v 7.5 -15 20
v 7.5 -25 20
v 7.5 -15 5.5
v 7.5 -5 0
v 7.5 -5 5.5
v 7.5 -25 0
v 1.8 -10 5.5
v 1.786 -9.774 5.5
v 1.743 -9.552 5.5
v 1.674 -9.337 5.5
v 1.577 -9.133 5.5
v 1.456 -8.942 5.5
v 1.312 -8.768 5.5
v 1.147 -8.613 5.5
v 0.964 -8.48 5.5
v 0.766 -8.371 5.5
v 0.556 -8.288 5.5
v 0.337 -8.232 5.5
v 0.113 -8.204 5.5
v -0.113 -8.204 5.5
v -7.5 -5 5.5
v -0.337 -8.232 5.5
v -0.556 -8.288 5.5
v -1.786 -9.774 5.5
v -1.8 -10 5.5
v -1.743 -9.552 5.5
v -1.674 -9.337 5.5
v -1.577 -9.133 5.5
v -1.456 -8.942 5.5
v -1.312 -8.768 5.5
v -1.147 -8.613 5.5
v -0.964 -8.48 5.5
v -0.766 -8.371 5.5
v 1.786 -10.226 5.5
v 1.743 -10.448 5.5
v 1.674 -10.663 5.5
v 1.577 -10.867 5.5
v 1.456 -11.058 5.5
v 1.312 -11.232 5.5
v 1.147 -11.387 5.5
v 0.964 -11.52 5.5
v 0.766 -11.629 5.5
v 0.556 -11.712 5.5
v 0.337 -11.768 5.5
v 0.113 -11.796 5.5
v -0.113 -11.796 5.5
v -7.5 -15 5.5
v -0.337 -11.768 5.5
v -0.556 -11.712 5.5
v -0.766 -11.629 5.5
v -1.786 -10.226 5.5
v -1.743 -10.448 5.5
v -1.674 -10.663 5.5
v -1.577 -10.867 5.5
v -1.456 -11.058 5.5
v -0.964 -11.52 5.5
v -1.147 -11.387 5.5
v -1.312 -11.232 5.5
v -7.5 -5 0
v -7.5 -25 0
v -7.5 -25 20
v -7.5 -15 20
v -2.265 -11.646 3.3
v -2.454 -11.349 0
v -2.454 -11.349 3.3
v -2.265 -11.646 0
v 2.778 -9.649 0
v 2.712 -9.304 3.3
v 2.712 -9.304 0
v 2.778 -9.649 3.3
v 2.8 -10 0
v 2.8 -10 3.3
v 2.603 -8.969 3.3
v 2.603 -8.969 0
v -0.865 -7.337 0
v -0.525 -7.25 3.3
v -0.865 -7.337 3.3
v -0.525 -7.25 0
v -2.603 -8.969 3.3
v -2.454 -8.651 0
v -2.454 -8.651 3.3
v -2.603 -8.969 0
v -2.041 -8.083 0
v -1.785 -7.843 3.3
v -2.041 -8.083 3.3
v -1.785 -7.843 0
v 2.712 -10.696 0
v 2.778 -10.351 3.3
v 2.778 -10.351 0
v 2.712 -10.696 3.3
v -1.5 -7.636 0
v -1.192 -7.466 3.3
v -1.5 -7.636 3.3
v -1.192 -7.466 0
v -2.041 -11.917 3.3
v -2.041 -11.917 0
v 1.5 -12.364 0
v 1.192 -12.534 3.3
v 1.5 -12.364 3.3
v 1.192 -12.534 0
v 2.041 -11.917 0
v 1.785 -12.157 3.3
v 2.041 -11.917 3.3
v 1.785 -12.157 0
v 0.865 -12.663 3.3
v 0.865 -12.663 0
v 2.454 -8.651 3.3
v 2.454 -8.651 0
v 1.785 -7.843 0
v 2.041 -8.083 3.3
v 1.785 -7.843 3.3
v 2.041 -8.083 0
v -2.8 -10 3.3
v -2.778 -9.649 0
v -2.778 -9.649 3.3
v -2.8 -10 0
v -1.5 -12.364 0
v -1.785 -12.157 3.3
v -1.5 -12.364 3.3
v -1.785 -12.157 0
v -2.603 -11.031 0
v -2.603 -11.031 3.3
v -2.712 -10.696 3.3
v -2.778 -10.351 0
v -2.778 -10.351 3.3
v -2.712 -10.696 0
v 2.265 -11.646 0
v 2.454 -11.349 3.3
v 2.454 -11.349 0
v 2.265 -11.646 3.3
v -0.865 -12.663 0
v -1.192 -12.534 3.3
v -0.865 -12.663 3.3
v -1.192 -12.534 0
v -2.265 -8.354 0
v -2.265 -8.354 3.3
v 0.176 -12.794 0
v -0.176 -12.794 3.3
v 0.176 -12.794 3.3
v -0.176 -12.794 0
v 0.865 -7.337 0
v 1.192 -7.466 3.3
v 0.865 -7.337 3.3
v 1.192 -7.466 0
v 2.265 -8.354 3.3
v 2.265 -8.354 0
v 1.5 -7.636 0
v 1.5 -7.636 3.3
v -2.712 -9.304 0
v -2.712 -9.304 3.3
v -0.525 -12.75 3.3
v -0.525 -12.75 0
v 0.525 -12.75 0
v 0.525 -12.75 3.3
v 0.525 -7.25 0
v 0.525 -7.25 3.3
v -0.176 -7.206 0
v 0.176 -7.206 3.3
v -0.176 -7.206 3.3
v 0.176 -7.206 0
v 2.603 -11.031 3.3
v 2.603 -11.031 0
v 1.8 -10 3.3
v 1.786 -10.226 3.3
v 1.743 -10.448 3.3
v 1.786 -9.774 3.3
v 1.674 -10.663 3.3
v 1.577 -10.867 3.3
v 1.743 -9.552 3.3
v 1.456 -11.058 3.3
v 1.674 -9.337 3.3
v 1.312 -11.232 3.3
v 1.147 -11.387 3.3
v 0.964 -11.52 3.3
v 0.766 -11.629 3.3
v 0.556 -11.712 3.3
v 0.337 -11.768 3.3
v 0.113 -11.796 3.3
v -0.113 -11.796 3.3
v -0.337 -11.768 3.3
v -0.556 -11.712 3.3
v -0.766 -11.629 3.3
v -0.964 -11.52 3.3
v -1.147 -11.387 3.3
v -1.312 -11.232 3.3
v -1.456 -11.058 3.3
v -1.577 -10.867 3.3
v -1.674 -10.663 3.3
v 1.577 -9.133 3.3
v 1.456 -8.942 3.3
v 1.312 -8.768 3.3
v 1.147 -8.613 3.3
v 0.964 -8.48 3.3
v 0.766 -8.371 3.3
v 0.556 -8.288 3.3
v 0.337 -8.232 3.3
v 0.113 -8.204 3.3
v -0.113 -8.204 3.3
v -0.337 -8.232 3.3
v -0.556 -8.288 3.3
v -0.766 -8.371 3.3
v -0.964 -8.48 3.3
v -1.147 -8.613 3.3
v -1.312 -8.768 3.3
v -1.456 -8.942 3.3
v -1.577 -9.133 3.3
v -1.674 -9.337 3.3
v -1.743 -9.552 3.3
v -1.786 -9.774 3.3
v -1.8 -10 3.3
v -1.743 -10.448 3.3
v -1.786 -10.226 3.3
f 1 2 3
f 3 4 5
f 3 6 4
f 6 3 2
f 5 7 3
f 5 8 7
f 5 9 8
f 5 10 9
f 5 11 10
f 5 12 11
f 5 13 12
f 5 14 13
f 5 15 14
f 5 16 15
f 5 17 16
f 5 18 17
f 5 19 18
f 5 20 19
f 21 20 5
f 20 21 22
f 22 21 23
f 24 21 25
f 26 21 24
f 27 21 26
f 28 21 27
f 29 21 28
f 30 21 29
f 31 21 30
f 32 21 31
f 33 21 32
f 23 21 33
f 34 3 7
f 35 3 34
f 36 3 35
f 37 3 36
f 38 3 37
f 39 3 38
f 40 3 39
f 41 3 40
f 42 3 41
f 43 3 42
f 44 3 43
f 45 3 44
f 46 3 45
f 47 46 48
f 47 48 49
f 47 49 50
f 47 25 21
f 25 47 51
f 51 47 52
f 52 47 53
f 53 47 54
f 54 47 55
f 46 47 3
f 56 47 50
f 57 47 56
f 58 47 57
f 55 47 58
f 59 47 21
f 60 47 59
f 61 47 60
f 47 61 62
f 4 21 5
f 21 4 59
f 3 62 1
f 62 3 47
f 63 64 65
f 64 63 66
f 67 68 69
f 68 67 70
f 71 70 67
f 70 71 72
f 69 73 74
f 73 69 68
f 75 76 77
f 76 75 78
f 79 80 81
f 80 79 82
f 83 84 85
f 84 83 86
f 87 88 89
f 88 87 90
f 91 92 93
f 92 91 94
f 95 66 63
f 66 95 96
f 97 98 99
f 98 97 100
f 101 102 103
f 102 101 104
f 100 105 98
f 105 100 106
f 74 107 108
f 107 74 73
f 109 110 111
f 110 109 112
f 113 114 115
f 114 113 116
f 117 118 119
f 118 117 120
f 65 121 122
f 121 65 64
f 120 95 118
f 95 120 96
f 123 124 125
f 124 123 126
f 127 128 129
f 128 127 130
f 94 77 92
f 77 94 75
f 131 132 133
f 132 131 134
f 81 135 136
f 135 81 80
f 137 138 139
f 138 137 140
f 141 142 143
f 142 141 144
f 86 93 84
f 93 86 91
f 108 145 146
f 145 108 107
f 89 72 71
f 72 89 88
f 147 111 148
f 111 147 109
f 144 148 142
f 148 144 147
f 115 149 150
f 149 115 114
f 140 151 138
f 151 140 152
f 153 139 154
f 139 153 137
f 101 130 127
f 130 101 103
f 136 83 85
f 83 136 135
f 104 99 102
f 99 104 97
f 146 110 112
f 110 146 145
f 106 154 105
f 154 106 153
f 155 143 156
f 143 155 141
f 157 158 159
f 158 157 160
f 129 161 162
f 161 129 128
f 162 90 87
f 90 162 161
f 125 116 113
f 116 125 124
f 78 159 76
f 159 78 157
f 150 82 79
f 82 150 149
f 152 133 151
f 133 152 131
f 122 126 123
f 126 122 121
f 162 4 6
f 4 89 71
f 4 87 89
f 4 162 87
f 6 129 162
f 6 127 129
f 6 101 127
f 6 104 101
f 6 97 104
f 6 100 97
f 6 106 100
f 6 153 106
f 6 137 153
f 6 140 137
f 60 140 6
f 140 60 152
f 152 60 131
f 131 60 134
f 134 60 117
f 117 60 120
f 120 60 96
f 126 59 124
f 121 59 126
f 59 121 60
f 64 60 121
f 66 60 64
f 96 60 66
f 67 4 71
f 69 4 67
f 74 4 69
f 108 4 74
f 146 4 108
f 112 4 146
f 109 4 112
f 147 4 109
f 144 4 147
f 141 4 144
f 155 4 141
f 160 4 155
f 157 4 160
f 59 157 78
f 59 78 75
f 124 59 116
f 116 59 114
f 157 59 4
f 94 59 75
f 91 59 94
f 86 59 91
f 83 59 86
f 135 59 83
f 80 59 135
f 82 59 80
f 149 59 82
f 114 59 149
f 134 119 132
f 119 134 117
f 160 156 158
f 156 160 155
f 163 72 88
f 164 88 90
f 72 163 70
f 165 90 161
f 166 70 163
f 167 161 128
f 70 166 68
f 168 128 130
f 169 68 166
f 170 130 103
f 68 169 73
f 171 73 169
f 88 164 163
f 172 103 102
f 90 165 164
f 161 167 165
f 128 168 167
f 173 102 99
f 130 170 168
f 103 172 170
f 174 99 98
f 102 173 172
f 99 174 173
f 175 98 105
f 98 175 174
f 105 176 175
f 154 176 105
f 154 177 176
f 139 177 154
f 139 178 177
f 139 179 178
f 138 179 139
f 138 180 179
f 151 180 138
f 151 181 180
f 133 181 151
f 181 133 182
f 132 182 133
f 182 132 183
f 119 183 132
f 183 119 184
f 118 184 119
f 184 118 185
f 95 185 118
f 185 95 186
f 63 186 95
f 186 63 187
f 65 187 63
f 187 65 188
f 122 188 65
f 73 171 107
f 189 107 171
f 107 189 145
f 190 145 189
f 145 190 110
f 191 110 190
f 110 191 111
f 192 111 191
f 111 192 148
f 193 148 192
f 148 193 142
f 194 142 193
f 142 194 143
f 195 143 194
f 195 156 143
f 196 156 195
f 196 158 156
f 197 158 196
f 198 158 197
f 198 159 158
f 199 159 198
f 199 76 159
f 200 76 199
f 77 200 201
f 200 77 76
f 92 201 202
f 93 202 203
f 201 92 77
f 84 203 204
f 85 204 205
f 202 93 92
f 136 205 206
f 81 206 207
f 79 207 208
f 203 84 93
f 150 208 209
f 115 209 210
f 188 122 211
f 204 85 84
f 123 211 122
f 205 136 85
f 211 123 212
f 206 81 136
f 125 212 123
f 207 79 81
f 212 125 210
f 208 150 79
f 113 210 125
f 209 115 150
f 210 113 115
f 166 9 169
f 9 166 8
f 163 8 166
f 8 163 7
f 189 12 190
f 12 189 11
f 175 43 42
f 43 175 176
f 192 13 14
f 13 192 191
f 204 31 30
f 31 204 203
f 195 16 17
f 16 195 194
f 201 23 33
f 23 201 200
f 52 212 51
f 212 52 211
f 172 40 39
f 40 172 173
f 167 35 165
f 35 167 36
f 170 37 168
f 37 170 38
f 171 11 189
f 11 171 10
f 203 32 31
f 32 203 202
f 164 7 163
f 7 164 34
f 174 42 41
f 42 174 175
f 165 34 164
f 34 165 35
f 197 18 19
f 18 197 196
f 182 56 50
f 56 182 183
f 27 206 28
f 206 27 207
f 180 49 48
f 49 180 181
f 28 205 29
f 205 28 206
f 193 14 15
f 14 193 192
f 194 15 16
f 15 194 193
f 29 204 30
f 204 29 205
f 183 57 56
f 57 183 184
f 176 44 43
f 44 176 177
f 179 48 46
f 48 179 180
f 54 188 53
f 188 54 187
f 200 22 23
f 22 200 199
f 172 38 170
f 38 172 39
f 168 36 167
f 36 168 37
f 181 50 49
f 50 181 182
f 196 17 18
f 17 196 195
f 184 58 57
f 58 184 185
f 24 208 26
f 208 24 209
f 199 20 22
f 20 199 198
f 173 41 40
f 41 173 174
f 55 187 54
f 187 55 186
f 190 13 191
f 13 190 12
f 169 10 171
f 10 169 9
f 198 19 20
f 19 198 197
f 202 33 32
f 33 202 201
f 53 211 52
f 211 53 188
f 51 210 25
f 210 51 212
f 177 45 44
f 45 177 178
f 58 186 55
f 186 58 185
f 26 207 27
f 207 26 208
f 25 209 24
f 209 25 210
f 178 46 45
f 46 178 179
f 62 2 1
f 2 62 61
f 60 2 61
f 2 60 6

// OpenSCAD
// 


module sq_nut(size) {
	difference(){
		union(){
			//additions
			cube(size=[size,size,2], center=true);
		}

		union(){
			//subtractions
			cylinder(h=2.1, r=1.5, center=true, $fn=50);
		}
	}
}

module 10m_hx_screw() {
	difference(){
		union(){
			//additions
			//thread
			cylinder(h=10, r=1.5, center=true, $fn=50);
			//head
			translate([0,0,-10/2]) cylinder(h=3, r=2.5, center=true, $fn=50);
		}

		union(){
			//subtractions
		}
	}
}

module right_hand_side() {
	sizeX = 15;
	sizeY = 20;	//to change to fit keeb
	sizeZ = 20;	//to change to fit keeb
	difference(){
		union(){
			//additions
			color("Green") cube(size=[sizeX,sizeY,sizeZ], center=true);
		}

		union(){
			//subtractions
			//interlock cut out
			translate([0,-sizeY/2 + 10/2, -sizeZ/2 + 6/2]) cube(size=[sizeX, 10, 6], center=true);
			//space for nut
			translate([0,-sizeY/2 + (10)/2, -sizeZ/2 + 3.5 + 6])
			hull(){
				translate([-sizeX/2 + 4.8, 0, 0]) scale([1,1,1.1]) sq_nut(5.3);
				translate([sizeX/2 , 0, 0]) scale([1,1,1.1]) sq_nut(5.3);
			}

			translate([0,-sizeY/2 + 5, -sizeZ/2 + 3.5]) cylinder(h=10, r=1.8, center=true, $fn=50);
		}
	}
}

module left_hand_side() {
	sizeX = 15;
	sizeY = 20;	//to change to fit keeb
	sizeZ = 20;	//to change to fit keeb
	difference(){
		union(){
			//additions
			color("Blue") cube(size=[sizeX,sizeY,sizeZ], center=true);
		}

		union(){
			//subtractions
			//interlock cut out
			translate([0, sizeZ/2 - 10/2, 5.5]) cube(size=[sizeX, 10, sizeZ], center=true);
			//space for head
			translate([0,sizeY/2 - 5, -sizeZ/2 + 3.3/2]) cylinder(h=3.3, r=2.8, center=true, $fn=50);
			//space for thread
			translate([0,sizeY/2 - 5, -sizeZ/2 + 3]) cylinder(h=10, r=1.8, center=true, $fn=50);
			
		}
	}
}

// sq_nut();
// translate([0,0,0]) 10m_hx_screw();


// translate([0,15,10]) right_hand_side();
translate([0,-15,10])left_hand_side();
